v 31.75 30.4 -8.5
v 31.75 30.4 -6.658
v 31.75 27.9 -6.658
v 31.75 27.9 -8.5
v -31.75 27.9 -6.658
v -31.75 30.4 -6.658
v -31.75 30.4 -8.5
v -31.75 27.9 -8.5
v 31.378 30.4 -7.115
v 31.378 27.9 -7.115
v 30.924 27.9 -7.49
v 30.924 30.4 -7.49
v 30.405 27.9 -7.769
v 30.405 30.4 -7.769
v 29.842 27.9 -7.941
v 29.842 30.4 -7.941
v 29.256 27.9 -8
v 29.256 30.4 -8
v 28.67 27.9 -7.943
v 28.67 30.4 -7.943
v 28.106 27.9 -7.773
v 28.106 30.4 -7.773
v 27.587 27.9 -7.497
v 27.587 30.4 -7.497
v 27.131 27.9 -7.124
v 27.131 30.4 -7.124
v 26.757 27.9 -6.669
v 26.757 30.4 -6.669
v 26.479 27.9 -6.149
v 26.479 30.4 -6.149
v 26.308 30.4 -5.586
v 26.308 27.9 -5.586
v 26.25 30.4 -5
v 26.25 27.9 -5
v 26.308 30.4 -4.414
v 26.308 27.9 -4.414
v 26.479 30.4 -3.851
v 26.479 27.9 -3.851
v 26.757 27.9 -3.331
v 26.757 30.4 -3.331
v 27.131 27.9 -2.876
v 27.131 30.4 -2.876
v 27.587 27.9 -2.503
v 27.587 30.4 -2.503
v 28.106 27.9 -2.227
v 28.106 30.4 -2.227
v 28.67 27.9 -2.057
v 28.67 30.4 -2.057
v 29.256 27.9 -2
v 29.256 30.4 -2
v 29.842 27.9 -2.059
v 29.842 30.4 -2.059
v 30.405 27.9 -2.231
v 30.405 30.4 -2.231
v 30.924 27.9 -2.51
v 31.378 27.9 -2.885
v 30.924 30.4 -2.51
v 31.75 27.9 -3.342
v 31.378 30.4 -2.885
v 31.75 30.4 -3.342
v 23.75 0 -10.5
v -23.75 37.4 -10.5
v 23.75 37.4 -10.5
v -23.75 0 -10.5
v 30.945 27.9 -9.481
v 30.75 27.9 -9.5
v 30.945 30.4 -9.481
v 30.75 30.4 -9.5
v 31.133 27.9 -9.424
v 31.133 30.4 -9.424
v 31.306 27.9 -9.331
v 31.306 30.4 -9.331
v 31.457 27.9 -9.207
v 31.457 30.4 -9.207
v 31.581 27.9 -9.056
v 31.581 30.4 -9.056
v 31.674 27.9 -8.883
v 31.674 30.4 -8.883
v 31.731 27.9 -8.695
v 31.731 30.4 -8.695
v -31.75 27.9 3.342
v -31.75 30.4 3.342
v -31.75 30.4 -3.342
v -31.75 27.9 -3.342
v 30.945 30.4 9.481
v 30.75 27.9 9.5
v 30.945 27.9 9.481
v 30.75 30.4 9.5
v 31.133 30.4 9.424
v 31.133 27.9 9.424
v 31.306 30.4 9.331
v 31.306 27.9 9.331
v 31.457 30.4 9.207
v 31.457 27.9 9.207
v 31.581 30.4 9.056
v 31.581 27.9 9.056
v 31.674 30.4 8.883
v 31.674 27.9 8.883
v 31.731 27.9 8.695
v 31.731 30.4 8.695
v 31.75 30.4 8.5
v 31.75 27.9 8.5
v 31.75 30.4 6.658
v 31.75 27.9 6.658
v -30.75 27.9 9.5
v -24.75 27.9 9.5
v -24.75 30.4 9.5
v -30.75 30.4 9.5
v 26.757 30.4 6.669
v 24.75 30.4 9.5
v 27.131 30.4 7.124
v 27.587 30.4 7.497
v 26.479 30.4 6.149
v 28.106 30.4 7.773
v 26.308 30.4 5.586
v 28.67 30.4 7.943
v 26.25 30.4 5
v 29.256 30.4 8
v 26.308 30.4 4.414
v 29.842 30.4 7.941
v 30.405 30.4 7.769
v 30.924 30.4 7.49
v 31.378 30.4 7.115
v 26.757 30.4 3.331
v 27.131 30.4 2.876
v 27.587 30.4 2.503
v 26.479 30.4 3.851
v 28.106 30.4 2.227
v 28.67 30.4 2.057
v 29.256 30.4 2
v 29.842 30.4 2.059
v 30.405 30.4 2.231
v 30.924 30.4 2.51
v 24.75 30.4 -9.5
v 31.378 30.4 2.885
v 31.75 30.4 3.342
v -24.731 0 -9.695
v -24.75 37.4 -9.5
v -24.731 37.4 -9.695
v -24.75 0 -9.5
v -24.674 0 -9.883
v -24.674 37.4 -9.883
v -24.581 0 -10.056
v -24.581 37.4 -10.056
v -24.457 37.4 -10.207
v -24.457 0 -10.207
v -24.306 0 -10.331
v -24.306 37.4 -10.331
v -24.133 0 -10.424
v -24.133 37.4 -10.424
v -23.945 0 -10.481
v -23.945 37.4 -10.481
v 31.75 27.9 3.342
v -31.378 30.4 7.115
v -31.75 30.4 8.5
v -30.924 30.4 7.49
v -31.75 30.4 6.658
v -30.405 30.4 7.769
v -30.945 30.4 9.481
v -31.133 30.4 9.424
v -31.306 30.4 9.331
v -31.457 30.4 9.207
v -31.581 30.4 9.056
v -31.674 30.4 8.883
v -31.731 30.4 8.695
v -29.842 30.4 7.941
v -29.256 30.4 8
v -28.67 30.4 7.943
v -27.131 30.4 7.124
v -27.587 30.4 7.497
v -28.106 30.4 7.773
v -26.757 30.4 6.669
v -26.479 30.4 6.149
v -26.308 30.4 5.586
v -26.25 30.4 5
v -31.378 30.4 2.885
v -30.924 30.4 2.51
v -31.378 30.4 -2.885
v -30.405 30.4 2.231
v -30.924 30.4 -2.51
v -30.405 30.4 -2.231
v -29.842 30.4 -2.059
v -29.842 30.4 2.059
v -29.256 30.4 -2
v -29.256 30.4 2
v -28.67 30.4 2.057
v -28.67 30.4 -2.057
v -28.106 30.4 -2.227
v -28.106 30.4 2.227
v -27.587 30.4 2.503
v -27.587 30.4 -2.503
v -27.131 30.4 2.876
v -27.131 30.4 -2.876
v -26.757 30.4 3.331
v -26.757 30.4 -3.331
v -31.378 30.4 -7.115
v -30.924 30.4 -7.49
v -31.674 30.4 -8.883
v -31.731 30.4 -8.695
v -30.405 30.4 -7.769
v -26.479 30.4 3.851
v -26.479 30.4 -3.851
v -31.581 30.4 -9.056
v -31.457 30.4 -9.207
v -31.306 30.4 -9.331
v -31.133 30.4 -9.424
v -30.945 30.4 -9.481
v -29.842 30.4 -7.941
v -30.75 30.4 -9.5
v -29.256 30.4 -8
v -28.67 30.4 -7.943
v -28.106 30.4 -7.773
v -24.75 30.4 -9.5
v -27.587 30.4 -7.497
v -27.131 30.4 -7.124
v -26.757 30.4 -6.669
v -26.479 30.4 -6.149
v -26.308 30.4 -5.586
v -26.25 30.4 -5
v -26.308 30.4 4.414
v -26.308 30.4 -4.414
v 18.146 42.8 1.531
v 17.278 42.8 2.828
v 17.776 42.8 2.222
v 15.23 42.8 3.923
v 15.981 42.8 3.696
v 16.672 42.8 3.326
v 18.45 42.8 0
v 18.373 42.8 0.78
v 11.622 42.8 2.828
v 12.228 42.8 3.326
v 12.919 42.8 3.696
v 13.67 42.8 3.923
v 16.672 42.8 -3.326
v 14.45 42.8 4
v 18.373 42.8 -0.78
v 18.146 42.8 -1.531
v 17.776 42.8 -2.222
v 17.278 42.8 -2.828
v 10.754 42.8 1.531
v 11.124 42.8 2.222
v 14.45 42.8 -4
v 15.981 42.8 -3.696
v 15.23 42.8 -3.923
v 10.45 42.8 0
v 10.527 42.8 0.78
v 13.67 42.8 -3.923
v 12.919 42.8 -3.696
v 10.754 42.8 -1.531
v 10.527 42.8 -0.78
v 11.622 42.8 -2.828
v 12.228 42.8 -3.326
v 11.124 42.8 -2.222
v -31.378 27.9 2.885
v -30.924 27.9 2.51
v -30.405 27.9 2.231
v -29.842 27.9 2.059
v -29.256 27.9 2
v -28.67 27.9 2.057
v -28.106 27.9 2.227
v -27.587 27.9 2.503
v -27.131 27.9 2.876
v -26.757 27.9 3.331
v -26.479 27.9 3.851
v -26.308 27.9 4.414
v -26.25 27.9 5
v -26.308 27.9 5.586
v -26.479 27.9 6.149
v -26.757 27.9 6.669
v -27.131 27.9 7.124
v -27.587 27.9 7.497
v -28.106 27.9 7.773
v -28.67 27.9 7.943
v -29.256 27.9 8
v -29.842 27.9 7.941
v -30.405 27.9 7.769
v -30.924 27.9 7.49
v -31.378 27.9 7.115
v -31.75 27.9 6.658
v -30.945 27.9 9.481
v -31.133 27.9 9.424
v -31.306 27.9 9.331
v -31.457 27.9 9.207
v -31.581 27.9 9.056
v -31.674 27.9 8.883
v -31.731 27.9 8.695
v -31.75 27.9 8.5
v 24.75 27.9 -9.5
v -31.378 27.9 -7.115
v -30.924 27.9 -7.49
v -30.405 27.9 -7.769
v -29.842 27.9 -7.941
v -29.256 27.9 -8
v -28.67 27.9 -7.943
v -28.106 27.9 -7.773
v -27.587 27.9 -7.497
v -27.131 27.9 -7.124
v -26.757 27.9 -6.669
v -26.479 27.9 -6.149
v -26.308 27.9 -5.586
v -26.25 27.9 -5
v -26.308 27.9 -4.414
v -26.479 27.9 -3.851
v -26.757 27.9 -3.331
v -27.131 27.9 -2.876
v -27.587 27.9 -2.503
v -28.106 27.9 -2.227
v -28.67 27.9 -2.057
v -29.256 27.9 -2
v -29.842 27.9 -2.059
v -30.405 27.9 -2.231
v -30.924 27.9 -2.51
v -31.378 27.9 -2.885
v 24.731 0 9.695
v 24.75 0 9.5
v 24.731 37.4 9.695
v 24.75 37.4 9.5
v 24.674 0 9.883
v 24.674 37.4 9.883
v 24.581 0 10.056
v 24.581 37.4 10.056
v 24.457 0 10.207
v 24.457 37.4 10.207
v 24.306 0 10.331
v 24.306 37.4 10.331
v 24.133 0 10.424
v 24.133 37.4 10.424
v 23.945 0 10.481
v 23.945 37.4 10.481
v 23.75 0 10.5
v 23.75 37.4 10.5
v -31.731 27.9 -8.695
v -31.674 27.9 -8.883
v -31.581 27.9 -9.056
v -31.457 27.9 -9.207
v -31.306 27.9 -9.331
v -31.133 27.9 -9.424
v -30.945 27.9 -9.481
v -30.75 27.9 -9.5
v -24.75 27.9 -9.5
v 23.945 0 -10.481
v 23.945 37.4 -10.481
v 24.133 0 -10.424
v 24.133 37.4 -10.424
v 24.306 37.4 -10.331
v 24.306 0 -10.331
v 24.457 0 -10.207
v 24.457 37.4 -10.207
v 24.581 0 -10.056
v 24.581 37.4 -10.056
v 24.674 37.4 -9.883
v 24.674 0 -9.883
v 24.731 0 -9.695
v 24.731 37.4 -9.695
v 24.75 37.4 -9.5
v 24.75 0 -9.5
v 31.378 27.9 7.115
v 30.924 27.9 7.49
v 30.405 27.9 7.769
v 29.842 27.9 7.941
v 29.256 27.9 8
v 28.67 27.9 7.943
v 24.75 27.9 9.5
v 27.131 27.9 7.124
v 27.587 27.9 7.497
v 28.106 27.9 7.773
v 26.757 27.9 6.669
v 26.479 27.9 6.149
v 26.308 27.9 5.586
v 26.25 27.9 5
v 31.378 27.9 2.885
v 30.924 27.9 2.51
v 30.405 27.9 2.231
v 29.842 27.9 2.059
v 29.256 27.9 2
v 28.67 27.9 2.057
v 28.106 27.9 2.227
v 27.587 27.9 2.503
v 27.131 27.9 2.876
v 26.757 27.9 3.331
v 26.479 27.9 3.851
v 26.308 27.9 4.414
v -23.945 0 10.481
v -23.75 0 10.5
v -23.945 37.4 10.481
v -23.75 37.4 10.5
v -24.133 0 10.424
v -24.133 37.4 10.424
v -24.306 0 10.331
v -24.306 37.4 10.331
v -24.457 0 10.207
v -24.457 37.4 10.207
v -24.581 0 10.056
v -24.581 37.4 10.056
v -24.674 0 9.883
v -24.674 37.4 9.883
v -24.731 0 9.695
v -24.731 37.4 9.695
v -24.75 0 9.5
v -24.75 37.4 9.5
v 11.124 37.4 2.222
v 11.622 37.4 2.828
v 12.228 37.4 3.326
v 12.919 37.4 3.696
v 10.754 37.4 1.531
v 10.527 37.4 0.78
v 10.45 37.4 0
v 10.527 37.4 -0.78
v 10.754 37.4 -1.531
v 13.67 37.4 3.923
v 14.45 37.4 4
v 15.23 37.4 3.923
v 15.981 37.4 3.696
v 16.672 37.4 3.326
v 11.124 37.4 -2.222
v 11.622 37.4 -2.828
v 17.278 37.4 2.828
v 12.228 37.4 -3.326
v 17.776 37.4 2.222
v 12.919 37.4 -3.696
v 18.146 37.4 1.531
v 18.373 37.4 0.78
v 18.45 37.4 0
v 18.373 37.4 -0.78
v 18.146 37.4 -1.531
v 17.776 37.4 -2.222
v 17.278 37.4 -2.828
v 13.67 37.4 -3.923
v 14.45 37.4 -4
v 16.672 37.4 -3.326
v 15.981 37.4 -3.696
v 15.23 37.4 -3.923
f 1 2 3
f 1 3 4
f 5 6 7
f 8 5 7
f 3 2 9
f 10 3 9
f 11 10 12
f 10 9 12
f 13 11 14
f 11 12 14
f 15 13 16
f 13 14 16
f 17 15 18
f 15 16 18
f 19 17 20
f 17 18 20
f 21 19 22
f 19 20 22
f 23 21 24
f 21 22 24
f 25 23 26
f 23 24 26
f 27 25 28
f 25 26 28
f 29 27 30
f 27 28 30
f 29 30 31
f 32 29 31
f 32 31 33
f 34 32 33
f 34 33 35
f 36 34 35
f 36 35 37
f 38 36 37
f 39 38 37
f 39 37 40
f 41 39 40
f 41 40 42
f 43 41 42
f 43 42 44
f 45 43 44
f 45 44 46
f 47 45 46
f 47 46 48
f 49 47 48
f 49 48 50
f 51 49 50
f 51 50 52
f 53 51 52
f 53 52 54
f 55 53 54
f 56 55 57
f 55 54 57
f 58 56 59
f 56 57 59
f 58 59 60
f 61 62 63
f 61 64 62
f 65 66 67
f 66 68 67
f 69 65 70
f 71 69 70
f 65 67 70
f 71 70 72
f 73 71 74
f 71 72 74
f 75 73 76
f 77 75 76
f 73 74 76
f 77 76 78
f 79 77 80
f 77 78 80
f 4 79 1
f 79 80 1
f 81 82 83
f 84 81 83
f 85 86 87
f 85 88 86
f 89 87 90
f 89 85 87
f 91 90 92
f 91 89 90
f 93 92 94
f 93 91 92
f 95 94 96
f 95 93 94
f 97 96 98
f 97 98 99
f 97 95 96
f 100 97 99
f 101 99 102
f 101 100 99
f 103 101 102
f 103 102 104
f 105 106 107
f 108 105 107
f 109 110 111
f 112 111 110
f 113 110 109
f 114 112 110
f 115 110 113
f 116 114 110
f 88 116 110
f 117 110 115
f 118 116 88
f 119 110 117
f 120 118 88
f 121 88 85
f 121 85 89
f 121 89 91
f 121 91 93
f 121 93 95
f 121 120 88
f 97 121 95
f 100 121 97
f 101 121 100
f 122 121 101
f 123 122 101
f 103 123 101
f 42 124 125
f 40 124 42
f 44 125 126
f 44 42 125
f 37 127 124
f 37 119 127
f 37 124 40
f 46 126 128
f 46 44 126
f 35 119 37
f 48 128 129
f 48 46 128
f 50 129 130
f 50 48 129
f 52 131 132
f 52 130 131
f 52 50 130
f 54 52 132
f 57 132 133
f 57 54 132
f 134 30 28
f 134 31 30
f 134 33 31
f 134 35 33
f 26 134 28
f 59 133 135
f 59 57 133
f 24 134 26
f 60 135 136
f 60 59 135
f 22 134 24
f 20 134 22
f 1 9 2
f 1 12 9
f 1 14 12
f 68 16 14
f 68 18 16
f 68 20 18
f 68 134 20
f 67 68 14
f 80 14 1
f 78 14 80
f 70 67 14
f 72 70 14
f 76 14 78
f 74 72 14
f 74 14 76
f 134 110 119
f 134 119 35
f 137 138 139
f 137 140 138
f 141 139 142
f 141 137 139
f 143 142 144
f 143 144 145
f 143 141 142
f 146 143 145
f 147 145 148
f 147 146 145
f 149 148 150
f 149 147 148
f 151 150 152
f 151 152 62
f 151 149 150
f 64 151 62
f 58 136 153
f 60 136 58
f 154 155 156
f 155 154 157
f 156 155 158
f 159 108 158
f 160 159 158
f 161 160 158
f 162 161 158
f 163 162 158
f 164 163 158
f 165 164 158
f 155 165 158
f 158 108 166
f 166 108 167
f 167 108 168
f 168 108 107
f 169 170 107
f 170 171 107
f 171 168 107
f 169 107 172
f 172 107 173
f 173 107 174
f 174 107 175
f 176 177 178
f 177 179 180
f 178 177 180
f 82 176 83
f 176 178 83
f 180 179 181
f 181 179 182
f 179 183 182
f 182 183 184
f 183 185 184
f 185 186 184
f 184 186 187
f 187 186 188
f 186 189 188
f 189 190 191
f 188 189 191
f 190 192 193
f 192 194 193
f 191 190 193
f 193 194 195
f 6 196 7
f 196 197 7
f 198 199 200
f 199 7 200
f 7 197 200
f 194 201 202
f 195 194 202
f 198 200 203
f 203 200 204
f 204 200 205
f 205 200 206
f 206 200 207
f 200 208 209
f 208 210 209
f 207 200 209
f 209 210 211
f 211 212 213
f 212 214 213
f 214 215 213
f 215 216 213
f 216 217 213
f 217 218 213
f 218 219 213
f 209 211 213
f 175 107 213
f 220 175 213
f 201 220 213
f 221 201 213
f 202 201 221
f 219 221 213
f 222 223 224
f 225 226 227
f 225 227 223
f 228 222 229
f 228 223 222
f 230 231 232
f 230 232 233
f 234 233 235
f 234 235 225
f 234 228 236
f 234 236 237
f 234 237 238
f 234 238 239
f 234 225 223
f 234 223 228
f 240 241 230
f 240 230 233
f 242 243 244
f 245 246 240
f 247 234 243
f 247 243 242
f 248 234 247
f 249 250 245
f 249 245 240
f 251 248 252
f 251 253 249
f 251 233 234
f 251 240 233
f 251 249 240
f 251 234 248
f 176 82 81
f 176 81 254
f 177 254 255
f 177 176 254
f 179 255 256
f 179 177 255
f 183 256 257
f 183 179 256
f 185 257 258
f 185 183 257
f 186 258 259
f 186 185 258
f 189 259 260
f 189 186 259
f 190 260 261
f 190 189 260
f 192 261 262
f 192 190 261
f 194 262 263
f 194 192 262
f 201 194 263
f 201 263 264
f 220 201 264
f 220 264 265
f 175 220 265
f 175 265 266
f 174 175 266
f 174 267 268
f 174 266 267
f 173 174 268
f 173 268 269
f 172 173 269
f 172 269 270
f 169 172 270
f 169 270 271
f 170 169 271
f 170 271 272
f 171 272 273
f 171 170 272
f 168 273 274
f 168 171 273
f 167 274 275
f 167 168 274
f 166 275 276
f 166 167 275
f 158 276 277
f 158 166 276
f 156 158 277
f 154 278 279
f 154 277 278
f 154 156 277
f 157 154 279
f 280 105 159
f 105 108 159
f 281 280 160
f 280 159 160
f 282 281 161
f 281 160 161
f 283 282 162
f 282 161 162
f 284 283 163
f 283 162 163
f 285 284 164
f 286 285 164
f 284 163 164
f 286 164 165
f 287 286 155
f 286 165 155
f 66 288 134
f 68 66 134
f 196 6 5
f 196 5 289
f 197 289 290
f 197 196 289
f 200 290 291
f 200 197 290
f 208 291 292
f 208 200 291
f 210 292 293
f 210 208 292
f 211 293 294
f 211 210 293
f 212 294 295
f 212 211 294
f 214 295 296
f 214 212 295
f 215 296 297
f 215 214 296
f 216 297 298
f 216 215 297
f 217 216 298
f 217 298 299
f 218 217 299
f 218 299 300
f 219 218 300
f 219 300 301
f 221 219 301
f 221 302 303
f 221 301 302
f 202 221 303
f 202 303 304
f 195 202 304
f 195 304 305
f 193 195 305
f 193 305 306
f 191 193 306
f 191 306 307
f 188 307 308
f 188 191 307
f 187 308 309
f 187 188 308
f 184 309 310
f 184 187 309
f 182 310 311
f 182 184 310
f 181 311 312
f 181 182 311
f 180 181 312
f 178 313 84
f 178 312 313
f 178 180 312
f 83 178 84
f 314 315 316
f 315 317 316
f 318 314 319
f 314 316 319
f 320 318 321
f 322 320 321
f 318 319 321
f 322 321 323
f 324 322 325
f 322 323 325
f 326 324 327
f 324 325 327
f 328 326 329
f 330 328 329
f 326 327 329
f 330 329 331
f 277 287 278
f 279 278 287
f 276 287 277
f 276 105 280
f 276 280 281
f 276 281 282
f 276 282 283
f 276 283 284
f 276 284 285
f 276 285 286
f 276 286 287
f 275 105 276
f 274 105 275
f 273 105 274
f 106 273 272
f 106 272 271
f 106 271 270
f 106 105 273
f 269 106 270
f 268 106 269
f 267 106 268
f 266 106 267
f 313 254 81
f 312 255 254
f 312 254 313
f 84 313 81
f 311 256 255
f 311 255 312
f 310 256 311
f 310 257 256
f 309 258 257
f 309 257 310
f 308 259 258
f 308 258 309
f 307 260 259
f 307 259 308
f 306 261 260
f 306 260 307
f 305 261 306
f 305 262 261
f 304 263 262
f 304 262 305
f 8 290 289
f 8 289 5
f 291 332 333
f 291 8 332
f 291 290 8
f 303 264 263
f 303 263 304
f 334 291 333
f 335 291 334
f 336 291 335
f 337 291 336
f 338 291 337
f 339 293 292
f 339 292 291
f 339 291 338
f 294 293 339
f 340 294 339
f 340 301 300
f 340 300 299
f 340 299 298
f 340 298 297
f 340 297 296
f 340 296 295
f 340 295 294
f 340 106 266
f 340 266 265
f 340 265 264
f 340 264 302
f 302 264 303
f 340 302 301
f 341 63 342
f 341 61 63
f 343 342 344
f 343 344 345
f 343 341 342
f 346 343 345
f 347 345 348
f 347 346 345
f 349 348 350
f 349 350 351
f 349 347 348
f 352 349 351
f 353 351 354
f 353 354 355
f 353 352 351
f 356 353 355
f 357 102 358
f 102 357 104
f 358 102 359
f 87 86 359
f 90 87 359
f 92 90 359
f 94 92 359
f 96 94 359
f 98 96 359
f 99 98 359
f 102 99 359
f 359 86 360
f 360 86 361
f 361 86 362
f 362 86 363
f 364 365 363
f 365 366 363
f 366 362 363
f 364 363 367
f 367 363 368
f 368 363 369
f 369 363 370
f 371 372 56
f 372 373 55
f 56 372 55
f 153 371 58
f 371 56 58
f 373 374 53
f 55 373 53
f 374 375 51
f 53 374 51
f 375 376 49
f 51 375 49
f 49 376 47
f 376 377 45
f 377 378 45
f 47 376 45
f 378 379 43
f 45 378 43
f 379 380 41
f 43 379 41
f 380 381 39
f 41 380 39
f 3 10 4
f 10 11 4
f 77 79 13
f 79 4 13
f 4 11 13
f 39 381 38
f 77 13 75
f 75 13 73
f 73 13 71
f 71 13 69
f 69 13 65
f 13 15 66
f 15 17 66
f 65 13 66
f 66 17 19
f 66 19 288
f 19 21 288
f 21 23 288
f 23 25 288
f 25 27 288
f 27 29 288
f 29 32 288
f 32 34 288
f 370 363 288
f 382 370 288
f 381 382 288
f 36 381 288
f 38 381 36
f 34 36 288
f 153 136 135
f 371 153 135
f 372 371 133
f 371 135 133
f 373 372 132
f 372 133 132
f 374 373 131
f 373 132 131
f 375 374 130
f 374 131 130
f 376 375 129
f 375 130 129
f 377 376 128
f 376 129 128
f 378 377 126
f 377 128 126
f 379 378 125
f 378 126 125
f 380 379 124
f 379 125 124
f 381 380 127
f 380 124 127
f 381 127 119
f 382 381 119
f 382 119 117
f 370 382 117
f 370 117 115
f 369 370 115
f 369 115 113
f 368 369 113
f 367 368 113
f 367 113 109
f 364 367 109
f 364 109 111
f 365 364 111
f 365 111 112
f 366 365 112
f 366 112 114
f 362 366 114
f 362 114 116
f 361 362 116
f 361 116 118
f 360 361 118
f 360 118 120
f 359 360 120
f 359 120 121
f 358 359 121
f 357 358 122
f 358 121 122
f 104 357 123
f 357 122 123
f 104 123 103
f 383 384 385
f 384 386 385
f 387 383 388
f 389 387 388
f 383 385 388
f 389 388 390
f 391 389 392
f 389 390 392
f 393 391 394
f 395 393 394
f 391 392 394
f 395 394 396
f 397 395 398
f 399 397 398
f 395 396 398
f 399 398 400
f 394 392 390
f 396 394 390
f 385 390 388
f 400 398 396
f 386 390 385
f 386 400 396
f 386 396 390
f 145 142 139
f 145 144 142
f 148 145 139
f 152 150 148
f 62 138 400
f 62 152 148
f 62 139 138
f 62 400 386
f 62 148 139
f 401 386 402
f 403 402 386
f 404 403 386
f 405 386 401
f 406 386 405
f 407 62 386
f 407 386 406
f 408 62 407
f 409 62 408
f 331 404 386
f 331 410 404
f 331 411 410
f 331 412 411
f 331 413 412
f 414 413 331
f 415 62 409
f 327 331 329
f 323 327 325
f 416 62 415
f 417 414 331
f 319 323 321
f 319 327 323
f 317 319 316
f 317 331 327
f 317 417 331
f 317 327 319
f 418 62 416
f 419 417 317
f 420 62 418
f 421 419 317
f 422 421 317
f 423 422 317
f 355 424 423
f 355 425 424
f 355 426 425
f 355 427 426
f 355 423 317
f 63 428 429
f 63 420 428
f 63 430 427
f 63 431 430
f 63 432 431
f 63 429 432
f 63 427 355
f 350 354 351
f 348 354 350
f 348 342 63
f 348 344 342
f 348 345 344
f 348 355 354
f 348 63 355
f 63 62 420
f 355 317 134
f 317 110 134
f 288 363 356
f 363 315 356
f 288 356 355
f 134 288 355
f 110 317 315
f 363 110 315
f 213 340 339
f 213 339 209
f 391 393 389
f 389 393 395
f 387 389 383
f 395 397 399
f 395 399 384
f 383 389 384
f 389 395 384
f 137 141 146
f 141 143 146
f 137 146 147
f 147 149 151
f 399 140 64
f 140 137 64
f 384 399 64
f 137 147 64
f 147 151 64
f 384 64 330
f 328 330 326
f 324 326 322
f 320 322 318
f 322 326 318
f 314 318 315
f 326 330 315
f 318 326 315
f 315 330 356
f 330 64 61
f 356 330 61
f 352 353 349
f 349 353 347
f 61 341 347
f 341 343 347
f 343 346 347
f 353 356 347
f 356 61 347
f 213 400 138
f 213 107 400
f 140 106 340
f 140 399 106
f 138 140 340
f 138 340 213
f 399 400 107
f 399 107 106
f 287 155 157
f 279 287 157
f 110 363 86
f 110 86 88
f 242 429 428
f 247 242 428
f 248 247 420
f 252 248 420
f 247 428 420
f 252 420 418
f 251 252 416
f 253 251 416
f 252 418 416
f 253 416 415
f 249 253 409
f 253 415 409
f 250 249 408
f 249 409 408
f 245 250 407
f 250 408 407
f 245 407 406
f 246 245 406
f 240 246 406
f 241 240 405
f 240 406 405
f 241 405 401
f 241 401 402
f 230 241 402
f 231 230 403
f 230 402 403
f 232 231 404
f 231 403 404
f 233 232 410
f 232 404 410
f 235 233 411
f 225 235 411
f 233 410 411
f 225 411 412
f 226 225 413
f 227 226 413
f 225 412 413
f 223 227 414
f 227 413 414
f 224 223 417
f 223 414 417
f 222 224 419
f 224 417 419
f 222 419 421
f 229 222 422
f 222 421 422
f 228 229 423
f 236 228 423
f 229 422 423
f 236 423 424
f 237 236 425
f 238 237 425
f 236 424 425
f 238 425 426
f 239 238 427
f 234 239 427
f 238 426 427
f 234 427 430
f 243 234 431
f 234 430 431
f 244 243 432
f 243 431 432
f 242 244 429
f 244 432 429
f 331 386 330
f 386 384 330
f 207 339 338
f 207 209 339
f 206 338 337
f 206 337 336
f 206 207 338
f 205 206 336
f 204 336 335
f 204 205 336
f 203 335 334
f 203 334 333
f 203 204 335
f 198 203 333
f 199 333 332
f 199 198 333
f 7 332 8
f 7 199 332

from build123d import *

# Parameters (mm, degrees)
SKETCH_1_W          = 49.5
SKETCH_1_H          = 21
EXTRUDE_1_DEPTH     = 30.4
SKETCH_2_W          = 19
SKETCH_2_H          = 2.5
EXTRUDE_2_DEPTH     = 7
SKETCH_3_W          = 49.5
SKETCH_3_H          = 21
EXTRUDE_3_DEPTH     = 7
SKETCH_4_R          = 3
CUT_EXTRUDE_1_DEPTH = 7
SKETCH_5_R          = 4
EXTRUDE_4_DEPTH     = 5.4
FILLET_1_R          = 1
FILLET_2_R          = 1
FILLET_3_R          = 1
FILLET_4_R          = 1
FILLET_5_R          = 1
FILLET_6_R          = 1
FILLET_7_R          = 1
FILLET_8_R          = 1


with BuildPart() as part:
    # 草图1 → 凸台-拉伸1 (new body)
    with BuildSketch(Plane(origin=(0, 0, 0), x_dir=(1, 0, 0), z_dir=(0, 1, 0))):
        Rectangle(SKETCH_1_W, SKETCH_1_H)
    extrude(amount=EXTRUDE_1_DEPTH)

    # 草图2 → 凸台-拉伸2 (add)
    with BuildSketch(Plane(origin=(24.75, 0, 0), x_dir=(0, 0, -1), z_dir=(1, 0, 0))):
        with Locations((0, 29.15)):
            Rectangle(SKETCH_2_W, SKETCH_2_H)
    extrude_2 = extrude(amount=EXTRUDE_2_DEPTH)

    # 草图3 → 凸台-拉伸3 (add)
    with BuildSketch(Plane(origin=(0, 30.4, 0), x_dir=(1, 0, 0), z_dir=(0, 1, 0))):
        Rectangle(SKETCH_3_W, SKETCH_3_H)
    extrude(amount=EXTRUDE_3_DEPTH)

    # 草图4 → 切除-拉伸1 (cut)
    with BuildSketch(Plane(origin=(0, 30.4, 0), x_dir=(1, 0, 0), z_dir=(0, 1, 0))):
        with Locations((29.25, 5)):
            Circle(SKETCH_4_R)
        with Locations((29.25, -5)):
            Circle(SKETCH_4_R)
    cut_extrude_1 = extrude(amount=-CUT_EXTRUDE_1_DEPTH, mode=Mode.SUBTRACT)

    # 草图5 → 凸台-拉伸4 (add)
    with BuildSketch(Plane(origin=(0, 37.4, 0), x_dir=(1, 0, 0), z_dir=(0, 1, 0))):
        with Locations(Location((14.45, 0, 0), (0, 0, 90))):
            Circle(SKETCH_5_R)
    extrude(amount=EXTRUDE_4_DEPTH)

    # 镜向2: 凸台-拉伸2, 切除-拉伸1 across plane
    add(extrude_2.mirror(Plane(origin=(0, 0, 0), x_dir=(0, 0, 1), z_dir=(1, 0, 0))))
    add(cut_extrude_1.mirror(Plane(origin=(0, 0, 0), x_dir=(0, 0, 1), z_dir=(1, 0, 0))), mode=Mode.SUBTRACT)

    # 圆角1
    fillet_1_edges = [part.edges().sort_by_distance(p)[0] for p in [
        (24.75, 18.7, -10.5),
    ]]
    fillet(fillet_1_edges, radius=FILLET_1_R - 0.0001)  # a hair under: the kernel refuses the full size

    # 圆角2
    fillet_2_edges = [part.edges().sort_by_distance(p)[0] for p in [
        (24.75, 18.7, 10.5),
    ]]
    fillet(fillet_2_edges, radius=FILLET_2_R - 0.0001)  # a hair under: the kernel refuses the full size

    # 圆角3
    fillet_3_edges = [part.edges().sort_by_distance(p)[0] for p in [
        (-24.75, 18.7, 10.5),
    ]]
    fillet(fillet_3_edges, radius=FILLET_3_R - 0.0001)  # a hair under: the kernel refuses the full size

    # 圆角4
    fillet_4_edges = [part.edges().sort_by_distance(p)[0] for p in [
        (-24.75, 18.7, -10.5),
    ]]
    fillet(fillet_4_edges, radius=FILLET_4_R - 0.0001)  # a hair under: the kernel refuses the full size

    # 圆角5
    fillet_5_edges = [part.edges().sort_by_distance(p)[0] for p in [
        (-31.75, 29.15, -9.5),
    ]]
    fillet(fillet_5_edges, radius=FILLET_5_R)

    # 圆角6
    fillet_6_edges = [part.edges().sort_by_distance(p)[0] for p in [
        (-31.75, 29.15, 9.5),
    ]]
    fillet(fillet_6_edges, radius=FILLET_6_R)

    # 圆角7
    fillet_7_edges = [part.edges().sort_by_distance(p)[0] for p in [
        (31.75, 29.15, 9.5),
    ]]
    fillet(fillet_7_edges, radius=FILLET_7_R)

    # 圆角8
    fillet_8_edges = [part.edges().sort_by_distance(p)[0] for p in [
        (31.75, 29.15, -9.5),
    ]]
    fillet(fillet_8_edges, radius=FILLET_8_R)


solid = part.part
